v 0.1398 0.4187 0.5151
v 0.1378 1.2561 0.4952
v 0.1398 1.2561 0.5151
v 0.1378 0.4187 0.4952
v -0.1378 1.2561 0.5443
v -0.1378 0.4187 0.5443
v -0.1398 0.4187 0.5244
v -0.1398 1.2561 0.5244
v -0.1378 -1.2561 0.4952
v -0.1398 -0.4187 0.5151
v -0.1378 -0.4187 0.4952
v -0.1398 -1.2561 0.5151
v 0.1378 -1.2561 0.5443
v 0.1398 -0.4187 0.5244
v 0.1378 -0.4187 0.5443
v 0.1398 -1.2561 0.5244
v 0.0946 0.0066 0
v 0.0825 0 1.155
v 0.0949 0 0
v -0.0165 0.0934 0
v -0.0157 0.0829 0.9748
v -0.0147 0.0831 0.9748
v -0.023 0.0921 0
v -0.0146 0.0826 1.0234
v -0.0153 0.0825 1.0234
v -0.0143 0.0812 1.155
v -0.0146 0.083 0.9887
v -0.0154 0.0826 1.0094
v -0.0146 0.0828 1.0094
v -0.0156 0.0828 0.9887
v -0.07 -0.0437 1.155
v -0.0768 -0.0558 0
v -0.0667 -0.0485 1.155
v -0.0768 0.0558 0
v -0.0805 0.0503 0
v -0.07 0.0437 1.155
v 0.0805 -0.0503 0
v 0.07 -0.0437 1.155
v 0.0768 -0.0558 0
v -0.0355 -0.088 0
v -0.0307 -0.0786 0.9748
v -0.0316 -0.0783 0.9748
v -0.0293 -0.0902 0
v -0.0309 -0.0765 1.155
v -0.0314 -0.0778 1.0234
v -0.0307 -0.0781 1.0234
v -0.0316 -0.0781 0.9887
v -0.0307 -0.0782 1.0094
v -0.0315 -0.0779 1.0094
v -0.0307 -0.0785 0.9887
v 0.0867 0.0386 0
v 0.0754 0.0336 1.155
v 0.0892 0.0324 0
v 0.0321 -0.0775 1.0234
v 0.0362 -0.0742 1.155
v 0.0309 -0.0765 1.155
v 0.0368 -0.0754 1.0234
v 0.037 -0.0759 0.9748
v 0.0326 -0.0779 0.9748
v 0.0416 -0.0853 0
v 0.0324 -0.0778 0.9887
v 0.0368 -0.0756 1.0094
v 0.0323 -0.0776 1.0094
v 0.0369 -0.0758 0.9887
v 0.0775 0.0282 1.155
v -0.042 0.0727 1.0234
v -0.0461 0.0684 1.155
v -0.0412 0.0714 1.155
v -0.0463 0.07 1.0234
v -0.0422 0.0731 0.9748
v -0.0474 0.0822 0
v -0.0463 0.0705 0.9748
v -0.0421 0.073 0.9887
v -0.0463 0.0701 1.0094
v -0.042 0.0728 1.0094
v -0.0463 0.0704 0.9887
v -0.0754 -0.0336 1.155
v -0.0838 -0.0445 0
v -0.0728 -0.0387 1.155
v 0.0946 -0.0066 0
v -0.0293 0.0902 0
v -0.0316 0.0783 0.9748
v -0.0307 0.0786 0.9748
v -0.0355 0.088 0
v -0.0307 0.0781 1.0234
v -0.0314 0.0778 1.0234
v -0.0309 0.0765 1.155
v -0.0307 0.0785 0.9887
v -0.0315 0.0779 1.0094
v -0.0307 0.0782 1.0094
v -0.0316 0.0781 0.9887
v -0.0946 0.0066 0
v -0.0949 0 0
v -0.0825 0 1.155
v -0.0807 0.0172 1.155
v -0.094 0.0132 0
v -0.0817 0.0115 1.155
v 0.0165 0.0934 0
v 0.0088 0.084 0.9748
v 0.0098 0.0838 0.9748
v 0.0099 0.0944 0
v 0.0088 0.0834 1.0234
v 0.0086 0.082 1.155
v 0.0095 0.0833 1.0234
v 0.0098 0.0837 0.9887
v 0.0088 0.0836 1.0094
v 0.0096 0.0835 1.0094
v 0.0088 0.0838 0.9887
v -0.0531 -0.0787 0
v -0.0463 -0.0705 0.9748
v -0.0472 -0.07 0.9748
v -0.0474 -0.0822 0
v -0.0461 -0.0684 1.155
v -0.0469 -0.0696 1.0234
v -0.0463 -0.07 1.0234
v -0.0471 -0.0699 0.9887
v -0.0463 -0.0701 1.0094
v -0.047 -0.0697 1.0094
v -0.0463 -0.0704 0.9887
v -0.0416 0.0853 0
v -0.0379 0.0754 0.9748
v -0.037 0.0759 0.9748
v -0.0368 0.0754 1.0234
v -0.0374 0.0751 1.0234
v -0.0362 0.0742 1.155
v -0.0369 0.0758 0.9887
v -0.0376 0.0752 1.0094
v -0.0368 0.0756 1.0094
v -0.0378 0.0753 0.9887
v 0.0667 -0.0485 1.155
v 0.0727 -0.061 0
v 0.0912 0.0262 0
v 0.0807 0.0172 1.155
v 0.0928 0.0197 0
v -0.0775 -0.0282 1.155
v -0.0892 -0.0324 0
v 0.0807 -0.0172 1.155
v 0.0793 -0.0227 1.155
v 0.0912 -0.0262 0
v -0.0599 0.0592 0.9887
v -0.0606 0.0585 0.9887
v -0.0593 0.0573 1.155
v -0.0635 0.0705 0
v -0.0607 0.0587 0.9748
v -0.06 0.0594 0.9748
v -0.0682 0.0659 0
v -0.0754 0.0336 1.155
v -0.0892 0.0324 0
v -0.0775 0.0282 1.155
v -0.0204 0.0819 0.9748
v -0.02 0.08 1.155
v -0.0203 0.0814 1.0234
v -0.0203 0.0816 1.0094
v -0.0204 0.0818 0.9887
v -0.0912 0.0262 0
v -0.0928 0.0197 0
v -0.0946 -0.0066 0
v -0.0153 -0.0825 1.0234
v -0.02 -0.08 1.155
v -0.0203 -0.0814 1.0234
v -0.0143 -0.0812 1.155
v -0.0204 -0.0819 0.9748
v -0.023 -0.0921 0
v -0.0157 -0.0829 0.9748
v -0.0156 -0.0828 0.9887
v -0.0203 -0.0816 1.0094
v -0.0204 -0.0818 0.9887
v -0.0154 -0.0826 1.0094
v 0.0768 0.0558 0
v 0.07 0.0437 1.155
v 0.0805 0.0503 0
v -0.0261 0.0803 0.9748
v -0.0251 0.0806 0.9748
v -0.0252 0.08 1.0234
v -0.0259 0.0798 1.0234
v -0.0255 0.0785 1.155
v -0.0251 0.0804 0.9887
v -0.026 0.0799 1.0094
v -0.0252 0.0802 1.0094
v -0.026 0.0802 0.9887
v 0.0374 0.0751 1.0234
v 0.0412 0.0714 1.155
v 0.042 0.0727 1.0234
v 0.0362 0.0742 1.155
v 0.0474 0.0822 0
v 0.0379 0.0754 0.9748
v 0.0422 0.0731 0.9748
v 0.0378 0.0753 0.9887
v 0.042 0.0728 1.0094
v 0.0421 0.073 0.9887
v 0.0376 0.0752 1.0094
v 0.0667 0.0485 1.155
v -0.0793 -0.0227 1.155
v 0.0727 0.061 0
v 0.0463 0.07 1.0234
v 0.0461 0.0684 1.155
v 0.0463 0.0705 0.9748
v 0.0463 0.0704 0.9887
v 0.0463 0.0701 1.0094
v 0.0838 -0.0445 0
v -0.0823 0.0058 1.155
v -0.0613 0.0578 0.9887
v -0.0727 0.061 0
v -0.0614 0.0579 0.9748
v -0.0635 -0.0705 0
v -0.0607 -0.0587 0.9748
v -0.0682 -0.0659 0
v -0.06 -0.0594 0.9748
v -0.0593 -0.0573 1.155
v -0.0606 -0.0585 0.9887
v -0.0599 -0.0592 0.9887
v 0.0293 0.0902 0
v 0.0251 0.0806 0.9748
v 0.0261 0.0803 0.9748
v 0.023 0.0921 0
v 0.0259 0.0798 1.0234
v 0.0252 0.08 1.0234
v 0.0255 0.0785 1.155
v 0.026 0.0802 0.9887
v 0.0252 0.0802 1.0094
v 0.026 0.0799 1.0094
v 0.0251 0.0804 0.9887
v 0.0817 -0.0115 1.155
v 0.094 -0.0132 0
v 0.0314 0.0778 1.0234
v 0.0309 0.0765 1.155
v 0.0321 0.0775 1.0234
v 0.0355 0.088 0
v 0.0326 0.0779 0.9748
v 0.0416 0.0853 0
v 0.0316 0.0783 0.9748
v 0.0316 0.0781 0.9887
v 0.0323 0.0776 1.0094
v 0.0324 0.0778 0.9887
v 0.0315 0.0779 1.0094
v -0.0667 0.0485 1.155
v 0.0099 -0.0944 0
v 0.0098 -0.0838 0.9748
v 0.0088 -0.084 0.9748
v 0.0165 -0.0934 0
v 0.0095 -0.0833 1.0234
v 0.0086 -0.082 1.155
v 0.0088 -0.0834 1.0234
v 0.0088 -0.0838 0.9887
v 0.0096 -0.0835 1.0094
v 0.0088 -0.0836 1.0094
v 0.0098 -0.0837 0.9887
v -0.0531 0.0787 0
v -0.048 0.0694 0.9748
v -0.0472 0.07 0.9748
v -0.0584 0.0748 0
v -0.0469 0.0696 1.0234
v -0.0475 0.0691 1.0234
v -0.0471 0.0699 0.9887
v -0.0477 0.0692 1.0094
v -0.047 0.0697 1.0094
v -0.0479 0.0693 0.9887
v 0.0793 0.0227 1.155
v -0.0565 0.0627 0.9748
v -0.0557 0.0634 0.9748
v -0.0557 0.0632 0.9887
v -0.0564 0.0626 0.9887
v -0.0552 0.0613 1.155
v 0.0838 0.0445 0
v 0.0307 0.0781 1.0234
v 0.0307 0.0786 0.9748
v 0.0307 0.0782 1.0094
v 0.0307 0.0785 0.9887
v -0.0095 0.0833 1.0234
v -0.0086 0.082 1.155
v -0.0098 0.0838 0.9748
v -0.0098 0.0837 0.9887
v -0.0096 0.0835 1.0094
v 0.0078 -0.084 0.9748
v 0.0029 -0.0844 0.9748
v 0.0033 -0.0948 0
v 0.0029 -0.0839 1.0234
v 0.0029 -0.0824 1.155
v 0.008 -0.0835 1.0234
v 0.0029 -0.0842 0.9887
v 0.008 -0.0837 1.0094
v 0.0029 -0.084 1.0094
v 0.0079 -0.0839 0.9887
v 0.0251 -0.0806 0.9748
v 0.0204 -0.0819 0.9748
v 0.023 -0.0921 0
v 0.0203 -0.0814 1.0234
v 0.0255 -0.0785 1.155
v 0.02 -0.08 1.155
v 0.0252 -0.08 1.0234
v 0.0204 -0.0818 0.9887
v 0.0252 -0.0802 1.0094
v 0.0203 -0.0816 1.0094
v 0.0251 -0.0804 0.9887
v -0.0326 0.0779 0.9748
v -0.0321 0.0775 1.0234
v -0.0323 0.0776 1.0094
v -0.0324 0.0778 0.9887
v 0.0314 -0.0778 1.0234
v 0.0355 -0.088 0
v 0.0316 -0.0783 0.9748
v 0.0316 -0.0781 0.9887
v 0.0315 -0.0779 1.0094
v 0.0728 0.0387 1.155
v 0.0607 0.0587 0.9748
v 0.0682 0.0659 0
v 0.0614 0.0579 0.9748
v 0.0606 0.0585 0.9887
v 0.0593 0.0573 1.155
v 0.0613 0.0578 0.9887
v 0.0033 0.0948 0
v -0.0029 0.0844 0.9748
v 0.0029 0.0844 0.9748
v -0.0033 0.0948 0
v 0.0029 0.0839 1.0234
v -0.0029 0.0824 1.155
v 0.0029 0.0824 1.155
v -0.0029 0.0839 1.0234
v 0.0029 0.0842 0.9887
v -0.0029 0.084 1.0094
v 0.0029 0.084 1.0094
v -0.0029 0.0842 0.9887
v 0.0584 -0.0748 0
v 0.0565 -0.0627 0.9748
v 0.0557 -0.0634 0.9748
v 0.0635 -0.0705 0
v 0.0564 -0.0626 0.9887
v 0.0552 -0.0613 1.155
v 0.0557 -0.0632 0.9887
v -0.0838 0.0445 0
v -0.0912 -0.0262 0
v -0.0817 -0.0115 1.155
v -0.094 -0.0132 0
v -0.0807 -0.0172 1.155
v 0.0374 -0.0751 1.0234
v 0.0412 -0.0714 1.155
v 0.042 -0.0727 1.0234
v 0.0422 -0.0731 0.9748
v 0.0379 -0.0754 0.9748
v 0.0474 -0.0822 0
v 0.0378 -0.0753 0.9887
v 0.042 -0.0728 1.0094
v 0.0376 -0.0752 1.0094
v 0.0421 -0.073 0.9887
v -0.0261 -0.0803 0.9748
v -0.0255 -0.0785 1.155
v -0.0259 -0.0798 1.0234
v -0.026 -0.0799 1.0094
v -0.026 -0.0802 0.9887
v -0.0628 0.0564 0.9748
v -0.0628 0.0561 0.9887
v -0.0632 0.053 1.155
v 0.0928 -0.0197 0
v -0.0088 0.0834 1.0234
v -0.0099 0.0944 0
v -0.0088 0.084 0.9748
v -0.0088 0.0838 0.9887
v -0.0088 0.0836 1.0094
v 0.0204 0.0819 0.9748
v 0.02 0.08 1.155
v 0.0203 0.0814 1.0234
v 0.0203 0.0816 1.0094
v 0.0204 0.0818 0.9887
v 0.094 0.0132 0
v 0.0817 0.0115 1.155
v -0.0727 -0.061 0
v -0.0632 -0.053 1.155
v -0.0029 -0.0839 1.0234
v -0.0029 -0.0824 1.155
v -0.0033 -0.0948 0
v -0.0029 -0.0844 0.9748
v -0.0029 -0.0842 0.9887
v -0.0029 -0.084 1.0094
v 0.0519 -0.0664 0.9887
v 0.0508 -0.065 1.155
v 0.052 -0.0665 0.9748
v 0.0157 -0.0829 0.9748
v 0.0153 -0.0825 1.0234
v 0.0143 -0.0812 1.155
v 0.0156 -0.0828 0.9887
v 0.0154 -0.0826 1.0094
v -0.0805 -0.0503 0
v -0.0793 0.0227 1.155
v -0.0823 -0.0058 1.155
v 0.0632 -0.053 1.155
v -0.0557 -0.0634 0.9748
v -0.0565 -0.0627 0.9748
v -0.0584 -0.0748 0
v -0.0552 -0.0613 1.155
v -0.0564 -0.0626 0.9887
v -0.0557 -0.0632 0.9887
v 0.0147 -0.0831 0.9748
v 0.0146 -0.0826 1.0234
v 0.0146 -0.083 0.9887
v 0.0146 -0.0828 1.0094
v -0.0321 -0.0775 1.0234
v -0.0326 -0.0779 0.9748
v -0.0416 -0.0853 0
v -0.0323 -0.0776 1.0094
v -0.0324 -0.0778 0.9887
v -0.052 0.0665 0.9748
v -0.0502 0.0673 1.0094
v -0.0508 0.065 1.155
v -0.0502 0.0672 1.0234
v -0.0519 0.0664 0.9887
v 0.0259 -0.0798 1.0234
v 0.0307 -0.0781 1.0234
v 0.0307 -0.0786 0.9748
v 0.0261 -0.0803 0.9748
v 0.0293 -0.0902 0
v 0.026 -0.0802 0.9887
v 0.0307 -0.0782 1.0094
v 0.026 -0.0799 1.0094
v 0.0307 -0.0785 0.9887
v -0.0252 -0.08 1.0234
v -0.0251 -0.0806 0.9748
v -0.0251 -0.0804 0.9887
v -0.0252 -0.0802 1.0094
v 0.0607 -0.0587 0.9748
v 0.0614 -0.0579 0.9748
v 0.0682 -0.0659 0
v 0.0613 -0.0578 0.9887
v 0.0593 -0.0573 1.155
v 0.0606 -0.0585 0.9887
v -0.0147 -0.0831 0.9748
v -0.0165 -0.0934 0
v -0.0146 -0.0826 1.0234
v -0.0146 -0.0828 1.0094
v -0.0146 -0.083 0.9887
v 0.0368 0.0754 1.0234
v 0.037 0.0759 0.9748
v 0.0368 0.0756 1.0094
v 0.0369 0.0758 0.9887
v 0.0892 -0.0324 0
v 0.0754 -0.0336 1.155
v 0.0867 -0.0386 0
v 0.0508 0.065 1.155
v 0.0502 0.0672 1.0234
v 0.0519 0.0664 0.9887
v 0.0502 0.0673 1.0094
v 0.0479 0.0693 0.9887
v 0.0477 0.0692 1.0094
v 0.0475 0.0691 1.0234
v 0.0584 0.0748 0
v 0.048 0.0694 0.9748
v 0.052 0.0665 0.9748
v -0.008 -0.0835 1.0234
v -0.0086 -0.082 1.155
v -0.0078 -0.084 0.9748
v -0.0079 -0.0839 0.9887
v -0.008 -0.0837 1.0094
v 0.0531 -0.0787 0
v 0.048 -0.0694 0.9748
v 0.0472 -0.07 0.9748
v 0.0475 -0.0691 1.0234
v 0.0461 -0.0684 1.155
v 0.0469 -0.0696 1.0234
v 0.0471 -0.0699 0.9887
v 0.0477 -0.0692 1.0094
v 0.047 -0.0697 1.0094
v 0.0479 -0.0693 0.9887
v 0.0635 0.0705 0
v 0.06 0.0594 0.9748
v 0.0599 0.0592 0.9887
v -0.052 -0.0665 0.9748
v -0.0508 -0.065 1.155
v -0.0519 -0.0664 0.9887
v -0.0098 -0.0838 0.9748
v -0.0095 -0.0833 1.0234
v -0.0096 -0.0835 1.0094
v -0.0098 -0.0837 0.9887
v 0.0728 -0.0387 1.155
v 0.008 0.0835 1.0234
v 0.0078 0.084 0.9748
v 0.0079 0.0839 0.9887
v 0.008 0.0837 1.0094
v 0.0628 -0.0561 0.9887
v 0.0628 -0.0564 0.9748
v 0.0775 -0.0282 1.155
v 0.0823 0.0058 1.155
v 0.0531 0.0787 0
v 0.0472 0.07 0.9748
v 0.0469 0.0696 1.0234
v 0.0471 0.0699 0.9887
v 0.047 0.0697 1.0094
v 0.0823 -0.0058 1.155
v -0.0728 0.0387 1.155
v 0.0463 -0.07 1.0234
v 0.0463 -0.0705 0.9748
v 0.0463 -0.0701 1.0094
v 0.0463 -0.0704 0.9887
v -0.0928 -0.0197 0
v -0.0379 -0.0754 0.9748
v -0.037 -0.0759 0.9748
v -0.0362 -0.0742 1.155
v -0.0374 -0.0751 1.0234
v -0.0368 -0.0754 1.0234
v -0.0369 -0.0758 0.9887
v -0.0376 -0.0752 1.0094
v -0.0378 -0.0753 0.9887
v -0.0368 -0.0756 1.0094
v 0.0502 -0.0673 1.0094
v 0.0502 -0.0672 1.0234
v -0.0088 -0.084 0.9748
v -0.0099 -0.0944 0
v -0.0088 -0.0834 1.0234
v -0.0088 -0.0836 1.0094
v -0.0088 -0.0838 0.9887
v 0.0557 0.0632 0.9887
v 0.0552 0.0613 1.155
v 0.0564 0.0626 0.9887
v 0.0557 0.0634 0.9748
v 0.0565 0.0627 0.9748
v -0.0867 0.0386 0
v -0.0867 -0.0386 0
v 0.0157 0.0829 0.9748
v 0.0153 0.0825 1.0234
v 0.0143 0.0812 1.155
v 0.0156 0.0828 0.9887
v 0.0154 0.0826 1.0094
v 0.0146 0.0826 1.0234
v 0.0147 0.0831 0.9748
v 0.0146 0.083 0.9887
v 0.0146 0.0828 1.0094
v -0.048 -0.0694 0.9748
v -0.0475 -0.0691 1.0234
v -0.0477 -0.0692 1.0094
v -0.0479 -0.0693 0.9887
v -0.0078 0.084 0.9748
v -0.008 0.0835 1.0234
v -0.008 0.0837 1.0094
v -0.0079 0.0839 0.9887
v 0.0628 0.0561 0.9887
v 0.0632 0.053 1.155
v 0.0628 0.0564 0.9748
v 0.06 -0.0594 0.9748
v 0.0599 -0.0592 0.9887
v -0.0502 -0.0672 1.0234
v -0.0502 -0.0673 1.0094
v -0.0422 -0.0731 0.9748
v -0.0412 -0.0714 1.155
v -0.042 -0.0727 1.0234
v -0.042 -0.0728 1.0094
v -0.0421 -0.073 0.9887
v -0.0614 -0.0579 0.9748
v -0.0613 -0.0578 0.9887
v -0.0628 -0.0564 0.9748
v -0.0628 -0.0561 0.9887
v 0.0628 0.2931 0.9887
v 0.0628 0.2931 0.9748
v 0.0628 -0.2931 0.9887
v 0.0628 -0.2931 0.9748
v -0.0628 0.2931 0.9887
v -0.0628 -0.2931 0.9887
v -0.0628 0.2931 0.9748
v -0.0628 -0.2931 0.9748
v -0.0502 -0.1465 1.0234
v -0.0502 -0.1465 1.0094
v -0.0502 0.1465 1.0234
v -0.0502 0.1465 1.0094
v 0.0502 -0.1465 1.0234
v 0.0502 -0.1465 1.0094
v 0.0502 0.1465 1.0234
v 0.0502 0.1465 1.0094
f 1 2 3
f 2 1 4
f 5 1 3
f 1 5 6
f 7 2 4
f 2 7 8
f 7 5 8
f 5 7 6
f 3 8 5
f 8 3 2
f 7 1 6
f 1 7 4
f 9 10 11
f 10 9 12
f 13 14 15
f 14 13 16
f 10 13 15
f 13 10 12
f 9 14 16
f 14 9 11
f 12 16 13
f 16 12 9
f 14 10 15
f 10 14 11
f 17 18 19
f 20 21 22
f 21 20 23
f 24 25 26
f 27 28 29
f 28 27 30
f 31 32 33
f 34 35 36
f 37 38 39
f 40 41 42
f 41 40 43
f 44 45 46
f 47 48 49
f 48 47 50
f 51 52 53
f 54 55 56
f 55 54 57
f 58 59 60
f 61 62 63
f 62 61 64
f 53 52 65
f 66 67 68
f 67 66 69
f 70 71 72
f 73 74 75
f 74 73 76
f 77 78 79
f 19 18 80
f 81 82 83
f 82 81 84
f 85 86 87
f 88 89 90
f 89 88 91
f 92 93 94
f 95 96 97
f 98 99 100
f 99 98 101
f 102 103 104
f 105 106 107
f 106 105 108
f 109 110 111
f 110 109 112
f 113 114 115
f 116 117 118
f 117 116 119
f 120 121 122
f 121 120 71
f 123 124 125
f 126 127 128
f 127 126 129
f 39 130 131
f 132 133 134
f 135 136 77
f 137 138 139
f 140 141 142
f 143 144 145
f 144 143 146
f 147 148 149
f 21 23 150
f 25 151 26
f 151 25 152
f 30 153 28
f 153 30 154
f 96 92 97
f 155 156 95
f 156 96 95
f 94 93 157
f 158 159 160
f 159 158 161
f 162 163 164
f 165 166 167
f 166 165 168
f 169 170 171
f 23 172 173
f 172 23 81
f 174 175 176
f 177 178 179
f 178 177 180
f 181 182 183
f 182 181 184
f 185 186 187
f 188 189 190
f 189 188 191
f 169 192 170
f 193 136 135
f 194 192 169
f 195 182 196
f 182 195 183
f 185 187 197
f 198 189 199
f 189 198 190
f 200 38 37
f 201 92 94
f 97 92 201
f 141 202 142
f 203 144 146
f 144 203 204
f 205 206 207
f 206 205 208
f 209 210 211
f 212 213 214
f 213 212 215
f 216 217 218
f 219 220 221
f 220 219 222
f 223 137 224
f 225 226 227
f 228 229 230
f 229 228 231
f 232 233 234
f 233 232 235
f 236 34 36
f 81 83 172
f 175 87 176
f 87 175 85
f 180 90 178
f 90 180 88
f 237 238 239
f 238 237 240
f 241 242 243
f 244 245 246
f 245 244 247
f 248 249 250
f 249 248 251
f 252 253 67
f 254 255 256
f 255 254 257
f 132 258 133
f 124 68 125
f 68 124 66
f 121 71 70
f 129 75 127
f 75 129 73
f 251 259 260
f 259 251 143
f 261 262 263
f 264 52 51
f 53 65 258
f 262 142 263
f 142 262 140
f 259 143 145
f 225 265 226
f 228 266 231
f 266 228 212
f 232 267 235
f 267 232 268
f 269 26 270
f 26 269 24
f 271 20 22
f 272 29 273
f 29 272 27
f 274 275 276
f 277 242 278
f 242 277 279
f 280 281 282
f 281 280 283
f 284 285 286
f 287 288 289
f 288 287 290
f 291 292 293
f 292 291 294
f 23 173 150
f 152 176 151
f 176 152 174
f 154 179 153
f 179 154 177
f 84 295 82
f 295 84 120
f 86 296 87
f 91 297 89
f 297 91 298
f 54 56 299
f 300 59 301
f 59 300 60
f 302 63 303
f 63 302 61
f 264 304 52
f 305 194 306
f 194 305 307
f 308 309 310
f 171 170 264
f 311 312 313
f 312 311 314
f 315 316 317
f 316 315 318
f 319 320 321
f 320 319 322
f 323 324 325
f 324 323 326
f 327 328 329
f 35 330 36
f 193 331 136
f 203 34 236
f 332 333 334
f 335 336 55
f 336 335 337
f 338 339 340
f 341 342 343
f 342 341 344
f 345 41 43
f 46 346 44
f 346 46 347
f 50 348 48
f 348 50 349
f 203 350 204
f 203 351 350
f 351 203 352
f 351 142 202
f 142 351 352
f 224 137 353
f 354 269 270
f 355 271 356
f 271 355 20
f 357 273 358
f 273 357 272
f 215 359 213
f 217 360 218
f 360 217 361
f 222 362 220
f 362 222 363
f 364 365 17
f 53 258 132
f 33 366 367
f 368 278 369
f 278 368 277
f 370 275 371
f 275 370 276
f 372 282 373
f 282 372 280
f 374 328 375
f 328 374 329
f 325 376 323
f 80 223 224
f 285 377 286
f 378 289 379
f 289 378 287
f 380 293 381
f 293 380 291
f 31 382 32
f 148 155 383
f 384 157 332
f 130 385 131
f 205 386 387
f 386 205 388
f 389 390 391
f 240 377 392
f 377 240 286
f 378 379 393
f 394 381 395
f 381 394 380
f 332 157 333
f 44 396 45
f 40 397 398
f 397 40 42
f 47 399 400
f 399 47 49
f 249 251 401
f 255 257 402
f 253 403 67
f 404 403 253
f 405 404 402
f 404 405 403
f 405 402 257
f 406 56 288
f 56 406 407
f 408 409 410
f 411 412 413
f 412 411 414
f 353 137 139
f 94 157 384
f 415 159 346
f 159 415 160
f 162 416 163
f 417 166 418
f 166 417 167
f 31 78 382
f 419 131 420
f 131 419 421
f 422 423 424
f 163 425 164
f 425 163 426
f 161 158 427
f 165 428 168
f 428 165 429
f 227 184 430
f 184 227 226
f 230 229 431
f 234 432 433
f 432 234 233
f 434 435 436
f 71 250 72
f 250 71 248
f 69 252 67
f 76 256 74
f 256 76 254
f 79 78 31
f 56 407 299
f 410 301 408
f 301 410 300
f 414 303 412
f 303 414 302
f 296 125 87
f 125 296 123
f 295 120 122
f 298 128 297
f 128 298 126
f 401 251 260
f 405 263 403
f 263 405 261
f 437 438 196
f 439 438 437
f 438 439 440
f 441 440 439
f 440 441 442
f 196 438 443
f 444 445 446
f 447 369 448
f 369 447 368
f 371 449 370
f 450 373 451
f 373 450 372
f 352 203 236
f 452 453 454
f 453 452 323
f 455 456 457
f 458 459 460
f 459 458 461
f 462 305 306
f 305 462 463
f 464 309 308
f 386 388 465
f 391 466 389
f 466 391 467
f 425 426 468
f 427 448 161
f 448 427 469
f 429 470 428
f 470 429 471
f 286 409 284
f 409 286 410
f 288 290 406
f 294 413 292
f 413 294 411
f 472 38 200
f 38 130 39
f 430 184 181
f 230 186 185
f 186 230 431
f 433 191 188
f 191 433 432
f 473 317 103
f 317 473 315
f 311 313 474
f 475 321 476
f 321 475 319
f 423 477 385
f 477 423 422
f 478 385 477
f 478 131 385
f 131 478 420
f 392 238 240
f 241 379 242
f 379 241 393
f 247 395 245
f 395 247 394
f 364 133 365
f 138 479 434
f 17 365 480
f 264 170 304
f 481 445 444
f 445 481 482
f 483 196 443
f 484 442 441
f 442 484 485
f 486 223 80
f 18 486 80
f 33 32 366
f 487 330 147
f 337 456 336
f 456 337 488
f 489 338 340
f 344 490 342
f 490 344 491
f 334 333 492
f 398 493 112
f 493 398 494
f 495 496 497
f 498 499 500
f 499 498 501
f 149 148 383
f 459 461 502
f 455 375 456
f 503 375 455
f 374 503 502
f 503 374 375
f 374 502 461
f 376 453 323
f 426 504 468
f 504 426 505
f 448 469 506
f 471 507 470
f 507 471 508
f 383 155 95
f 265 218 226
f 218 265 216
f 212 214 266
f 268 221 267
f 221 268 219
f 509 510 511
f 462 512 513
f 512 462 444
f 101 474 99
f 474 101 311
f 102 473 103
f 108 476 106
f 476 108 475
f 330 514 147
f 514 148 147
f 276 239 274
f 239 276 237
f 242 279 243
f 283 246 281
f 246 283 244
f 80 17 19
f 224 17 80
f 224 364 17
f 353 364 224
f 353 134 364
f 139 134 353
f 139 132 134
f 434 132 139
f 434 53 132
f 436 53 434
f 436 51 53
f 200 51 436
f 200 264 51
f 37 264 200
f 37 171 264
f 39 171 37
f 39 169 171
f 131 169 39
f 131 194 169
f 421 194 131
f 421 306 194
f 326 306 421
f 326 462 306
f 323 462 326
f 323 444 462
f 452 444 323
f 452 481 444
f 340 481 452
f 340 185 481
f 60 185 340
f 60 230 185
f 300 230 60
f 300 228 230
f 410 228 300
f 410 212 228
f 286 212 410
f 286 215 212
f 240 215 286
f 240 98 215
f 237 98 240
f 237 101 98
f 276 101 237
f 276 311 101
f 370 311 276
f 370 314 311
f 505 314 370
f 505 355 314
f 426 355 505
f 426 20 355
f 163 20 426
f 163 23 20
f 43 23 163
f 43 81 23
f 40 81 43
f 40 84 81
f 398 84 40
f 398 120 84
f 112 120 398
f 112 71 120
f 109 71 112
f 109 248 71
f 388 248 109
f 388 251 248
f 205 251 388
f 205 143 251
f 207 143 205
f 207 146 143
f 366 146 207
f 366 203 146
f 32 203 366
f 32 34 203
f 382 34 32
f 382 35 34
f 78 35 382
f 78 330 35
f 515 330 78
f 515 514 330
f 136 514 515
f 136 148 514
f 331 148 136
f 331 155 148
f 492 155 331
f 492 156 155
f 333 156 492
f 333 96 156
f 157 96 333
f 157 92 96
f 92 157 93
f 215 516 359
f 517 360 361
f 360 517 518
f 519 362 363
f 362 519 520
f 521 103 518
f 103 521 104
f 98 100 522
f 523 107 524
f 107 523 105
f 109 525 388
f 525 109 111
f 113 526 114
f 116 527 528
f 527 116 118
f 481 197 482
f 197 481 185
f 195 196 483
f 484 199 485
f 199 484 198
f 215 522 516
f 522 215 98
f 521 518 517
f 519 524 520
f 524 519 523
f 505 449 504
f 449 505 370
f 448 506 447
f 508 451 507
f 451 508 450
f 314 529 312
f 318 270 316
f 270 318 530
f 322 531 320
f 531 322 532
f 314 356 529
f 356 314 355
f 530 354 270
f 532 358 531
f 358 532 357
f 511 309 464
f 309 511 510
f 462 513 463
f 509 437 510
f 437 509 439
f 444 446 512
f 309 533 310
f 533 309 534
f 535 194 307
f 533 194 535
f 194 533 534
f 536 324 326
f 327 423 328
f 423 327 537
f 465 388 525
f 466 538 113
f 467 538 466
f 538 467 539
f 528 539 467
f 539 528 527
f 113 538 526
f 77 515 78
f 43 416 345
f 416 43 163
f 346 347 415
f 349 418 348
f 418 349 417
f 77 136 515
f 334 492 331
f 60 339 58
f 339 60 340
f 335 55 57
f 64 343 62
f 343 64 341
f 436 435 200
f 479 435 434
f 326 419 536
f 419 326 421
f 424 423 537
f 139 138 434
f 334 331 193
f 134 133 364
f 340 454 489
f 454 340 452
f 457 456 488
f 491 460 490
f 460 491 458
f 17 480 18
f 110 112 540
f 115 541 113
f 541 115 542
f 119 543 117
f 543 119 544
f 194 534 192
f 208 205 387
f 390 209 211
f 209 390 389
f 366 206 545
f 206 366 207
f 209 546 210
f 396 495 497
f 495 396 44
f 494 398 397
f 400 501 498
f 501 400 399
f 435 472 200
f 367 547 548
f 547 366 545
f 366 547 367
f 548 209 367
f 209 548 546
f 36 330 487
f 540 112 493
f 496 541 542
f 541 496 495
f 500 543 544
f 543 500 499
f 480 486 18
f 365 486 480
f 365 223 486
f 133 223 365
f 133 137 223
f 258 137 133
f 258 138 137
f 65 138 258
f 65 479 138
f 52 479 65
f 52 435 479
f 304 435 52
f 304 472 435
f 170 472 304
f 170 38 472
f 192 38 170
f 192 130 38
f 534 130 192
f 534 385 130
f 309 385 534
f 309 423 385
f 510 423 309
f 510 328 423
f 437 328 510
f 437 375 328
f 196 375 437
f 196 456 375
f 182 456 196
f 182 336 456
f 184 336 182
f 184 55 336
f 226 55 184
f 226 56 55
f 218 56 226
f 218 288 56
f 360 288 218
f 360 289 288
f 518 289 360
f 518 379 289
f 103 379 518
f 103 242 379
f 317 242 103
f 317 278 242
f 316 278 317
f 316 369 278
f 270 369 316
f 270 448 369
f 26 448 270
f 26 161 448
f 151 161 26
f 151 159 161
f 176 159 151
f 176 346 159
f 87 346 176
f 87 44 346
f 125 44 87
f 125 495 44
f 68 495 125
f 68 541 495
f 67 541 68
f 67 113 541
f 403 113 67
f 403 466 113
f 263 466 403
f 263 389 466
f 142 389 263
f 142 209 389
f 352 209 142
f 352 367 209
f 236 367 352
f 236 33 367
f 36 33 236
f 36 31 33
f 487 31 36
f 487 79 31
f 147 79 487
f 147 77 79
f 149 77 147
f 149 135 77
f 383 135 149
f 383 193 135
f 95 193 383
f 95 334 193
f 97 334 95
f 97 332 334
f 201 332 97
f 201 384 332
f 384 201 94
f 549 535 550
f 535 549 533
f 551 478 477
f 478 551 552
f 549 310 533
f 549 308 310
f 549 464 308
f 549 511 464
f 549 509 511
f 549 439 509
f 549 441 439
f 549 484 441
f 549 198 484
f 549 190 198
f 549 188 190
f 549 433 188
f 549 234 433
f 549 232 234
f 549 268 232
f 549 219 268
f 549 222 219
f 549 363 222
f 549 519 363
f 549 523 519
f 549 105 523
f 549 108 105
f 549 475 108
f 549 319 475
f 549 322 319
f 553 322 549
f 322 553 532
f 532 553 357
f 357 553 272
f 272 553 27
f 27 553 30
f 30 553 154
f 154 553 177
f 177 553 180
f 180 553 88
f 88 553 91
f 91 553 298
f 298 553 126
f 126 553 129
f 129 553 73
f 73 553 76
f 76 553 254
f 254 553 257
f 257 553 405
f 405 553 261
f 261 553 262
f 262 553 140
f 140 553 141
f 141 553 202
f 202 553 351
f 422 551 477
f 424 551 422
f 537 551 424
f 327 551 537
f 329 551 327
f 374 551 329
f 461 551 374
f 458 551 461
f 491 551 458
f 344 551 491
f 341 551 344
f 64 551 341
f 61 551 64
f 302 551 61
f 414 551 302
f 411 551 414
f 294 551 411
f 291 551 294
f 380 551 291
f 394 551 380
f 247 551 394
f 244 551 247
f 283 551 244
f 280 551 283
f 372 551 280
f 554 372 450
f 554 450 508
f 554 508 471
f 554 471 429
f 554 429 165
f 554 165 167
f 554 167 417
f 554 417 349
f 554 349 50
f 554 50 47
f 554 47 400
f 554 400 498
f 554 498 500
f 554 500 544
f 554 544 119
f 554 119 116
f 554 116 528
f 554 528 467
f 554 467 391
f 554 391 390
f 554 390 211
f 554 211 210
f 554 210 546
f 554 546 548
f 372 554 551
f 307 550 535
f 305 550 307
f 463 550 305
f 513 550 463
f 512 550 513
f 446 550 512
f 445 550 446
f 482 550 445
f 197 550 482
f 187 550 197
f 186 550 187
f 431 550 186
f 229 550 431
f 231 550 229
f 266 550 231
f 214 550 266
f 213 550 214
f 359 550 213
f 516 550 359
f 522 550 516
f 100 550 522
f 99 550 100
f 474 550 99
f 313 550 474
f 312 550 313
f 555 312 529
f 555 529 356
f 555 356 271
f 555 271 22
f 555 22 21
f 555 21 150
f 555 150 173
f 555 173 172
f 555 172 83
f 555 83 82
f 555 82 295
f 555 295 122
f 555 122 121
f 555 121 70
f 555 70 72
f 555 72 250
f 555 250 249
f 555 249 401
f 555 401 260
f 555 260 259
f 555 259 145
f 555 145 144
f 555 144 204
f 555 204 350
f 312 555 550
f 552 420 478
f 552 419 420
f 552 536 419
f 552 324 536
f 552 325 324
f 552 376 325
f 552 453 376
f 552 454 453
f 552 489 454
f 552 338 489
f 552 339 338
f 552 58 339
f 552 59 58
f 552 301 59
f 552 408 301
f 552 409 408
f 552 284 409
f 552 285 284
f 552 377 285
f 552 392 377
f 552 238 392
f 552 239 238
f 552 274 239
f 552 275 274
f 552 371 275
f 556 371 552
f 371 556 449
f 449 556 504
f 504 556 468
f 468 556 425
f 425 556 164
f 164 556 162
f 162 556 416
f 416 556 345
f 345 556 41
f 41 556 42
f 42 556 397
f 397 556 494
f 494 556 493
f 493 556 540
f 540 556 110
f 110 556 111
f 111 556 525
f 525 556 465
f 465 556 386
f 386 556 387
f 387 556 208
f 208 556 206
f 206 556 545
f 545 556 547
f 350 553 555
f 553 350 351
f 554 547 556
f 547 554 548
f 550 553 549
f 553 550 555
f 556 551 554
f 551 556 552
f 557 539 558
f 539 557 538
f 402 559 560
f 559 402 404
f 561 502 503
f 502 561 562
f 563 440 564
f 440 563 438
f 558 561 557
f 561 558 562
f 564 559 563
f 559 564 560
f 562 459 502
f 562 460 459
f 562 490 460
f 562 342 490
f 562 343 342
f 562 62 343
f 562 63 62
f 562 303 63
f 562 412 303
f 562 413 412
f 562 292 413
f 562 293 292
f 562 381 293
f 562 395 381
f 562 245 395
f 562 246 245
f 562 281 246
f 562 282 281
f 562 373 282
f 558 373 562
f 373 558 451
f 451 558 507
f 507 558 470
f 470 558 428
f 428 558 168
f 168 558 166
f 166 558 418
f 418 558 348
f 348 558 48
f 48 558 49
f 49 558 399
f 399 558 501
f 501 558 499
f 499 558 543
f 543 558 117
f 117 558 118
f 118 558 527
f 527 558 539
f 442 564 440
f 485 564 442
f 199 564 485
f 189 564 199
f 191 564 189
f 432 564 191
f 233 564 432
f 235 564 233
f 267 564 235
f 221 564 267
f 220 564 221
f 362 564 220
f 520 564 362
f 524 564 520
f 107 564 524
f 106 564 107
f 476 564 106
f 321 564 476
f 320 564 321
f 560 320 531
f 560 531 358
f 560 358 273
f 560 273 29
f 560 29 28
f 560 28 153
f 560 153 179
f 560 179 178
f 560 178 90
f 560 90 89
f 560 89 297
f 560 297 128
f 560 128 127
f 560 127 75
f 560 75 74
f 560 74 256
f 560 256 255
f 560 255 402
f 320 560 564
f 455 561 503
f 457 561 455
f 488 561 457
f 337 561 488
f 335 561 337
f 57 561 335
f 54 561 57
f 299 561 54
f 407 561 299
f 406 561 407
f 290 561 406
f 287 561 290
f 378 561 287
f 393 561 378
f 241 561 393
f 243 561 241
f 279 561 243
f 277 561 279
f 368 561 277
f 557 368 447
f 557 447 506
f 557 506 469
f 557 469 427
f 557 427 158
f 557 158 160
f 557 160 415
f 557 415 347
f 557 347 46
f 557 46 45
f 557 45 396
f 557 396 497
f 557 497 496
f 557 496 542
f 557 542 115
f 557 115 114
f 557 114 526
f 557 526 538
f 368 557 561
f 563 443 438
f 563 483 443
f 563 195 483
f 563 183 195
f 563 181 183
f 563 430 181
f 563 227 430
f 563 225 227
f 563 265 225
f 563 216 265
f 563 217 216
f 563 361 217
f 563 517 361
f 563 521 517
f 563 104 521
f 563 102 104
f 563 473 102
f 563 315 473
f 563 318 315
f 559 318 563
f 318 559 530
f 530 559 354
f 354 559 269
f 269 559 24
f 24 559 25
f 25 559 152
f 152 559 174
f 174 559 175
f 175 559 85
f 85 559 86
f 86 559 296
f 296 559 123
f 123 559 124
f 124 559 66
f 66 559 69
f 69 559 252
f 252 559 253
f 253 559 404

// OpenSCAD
// ==========================================
// GENERATED AIRCRAFT VARIANT 2
// ==========================================

$fn = 90;

// --------- FUSELAGE ----------
module fuselage() {
    cylinder(h=1.1550000000000002,
             r1=0.09487500000000001,
             r2=0.08250000000000002,
             center=false);
}

// --------- WING ----------
module wing_half(sign=1) {
    rotate([0, 6*sign, 0])
    translate([0, sign*0.8373750000000003, 0])
    cube([0.2791250000000001,
          0.8373750000000003,
          0.019937500000000007],
          center=true);
}

module wing() {
    wing_half(1);
    wing_half(-1);
}

// --------- TAIL ----------
module tail() {
    translate([0, 0, 0.9817500000000002])
    cube([0.12560625000000006,
          0.5861625000000001,
          0.013956250000000003],
          center=true);
}

module vertical_tail() {
    translate([0, 0, 1.0164000000000002])
    rotate([90,0,0])
    cube([0.10048500000000005,
          0.013956250000000003,
          0.29308125000000007],
          center=true);
}

union() {
    fuselage();
    translate([0,0,0.5197500000000002]) wing();
    tail();
    vertical_tail();
}
